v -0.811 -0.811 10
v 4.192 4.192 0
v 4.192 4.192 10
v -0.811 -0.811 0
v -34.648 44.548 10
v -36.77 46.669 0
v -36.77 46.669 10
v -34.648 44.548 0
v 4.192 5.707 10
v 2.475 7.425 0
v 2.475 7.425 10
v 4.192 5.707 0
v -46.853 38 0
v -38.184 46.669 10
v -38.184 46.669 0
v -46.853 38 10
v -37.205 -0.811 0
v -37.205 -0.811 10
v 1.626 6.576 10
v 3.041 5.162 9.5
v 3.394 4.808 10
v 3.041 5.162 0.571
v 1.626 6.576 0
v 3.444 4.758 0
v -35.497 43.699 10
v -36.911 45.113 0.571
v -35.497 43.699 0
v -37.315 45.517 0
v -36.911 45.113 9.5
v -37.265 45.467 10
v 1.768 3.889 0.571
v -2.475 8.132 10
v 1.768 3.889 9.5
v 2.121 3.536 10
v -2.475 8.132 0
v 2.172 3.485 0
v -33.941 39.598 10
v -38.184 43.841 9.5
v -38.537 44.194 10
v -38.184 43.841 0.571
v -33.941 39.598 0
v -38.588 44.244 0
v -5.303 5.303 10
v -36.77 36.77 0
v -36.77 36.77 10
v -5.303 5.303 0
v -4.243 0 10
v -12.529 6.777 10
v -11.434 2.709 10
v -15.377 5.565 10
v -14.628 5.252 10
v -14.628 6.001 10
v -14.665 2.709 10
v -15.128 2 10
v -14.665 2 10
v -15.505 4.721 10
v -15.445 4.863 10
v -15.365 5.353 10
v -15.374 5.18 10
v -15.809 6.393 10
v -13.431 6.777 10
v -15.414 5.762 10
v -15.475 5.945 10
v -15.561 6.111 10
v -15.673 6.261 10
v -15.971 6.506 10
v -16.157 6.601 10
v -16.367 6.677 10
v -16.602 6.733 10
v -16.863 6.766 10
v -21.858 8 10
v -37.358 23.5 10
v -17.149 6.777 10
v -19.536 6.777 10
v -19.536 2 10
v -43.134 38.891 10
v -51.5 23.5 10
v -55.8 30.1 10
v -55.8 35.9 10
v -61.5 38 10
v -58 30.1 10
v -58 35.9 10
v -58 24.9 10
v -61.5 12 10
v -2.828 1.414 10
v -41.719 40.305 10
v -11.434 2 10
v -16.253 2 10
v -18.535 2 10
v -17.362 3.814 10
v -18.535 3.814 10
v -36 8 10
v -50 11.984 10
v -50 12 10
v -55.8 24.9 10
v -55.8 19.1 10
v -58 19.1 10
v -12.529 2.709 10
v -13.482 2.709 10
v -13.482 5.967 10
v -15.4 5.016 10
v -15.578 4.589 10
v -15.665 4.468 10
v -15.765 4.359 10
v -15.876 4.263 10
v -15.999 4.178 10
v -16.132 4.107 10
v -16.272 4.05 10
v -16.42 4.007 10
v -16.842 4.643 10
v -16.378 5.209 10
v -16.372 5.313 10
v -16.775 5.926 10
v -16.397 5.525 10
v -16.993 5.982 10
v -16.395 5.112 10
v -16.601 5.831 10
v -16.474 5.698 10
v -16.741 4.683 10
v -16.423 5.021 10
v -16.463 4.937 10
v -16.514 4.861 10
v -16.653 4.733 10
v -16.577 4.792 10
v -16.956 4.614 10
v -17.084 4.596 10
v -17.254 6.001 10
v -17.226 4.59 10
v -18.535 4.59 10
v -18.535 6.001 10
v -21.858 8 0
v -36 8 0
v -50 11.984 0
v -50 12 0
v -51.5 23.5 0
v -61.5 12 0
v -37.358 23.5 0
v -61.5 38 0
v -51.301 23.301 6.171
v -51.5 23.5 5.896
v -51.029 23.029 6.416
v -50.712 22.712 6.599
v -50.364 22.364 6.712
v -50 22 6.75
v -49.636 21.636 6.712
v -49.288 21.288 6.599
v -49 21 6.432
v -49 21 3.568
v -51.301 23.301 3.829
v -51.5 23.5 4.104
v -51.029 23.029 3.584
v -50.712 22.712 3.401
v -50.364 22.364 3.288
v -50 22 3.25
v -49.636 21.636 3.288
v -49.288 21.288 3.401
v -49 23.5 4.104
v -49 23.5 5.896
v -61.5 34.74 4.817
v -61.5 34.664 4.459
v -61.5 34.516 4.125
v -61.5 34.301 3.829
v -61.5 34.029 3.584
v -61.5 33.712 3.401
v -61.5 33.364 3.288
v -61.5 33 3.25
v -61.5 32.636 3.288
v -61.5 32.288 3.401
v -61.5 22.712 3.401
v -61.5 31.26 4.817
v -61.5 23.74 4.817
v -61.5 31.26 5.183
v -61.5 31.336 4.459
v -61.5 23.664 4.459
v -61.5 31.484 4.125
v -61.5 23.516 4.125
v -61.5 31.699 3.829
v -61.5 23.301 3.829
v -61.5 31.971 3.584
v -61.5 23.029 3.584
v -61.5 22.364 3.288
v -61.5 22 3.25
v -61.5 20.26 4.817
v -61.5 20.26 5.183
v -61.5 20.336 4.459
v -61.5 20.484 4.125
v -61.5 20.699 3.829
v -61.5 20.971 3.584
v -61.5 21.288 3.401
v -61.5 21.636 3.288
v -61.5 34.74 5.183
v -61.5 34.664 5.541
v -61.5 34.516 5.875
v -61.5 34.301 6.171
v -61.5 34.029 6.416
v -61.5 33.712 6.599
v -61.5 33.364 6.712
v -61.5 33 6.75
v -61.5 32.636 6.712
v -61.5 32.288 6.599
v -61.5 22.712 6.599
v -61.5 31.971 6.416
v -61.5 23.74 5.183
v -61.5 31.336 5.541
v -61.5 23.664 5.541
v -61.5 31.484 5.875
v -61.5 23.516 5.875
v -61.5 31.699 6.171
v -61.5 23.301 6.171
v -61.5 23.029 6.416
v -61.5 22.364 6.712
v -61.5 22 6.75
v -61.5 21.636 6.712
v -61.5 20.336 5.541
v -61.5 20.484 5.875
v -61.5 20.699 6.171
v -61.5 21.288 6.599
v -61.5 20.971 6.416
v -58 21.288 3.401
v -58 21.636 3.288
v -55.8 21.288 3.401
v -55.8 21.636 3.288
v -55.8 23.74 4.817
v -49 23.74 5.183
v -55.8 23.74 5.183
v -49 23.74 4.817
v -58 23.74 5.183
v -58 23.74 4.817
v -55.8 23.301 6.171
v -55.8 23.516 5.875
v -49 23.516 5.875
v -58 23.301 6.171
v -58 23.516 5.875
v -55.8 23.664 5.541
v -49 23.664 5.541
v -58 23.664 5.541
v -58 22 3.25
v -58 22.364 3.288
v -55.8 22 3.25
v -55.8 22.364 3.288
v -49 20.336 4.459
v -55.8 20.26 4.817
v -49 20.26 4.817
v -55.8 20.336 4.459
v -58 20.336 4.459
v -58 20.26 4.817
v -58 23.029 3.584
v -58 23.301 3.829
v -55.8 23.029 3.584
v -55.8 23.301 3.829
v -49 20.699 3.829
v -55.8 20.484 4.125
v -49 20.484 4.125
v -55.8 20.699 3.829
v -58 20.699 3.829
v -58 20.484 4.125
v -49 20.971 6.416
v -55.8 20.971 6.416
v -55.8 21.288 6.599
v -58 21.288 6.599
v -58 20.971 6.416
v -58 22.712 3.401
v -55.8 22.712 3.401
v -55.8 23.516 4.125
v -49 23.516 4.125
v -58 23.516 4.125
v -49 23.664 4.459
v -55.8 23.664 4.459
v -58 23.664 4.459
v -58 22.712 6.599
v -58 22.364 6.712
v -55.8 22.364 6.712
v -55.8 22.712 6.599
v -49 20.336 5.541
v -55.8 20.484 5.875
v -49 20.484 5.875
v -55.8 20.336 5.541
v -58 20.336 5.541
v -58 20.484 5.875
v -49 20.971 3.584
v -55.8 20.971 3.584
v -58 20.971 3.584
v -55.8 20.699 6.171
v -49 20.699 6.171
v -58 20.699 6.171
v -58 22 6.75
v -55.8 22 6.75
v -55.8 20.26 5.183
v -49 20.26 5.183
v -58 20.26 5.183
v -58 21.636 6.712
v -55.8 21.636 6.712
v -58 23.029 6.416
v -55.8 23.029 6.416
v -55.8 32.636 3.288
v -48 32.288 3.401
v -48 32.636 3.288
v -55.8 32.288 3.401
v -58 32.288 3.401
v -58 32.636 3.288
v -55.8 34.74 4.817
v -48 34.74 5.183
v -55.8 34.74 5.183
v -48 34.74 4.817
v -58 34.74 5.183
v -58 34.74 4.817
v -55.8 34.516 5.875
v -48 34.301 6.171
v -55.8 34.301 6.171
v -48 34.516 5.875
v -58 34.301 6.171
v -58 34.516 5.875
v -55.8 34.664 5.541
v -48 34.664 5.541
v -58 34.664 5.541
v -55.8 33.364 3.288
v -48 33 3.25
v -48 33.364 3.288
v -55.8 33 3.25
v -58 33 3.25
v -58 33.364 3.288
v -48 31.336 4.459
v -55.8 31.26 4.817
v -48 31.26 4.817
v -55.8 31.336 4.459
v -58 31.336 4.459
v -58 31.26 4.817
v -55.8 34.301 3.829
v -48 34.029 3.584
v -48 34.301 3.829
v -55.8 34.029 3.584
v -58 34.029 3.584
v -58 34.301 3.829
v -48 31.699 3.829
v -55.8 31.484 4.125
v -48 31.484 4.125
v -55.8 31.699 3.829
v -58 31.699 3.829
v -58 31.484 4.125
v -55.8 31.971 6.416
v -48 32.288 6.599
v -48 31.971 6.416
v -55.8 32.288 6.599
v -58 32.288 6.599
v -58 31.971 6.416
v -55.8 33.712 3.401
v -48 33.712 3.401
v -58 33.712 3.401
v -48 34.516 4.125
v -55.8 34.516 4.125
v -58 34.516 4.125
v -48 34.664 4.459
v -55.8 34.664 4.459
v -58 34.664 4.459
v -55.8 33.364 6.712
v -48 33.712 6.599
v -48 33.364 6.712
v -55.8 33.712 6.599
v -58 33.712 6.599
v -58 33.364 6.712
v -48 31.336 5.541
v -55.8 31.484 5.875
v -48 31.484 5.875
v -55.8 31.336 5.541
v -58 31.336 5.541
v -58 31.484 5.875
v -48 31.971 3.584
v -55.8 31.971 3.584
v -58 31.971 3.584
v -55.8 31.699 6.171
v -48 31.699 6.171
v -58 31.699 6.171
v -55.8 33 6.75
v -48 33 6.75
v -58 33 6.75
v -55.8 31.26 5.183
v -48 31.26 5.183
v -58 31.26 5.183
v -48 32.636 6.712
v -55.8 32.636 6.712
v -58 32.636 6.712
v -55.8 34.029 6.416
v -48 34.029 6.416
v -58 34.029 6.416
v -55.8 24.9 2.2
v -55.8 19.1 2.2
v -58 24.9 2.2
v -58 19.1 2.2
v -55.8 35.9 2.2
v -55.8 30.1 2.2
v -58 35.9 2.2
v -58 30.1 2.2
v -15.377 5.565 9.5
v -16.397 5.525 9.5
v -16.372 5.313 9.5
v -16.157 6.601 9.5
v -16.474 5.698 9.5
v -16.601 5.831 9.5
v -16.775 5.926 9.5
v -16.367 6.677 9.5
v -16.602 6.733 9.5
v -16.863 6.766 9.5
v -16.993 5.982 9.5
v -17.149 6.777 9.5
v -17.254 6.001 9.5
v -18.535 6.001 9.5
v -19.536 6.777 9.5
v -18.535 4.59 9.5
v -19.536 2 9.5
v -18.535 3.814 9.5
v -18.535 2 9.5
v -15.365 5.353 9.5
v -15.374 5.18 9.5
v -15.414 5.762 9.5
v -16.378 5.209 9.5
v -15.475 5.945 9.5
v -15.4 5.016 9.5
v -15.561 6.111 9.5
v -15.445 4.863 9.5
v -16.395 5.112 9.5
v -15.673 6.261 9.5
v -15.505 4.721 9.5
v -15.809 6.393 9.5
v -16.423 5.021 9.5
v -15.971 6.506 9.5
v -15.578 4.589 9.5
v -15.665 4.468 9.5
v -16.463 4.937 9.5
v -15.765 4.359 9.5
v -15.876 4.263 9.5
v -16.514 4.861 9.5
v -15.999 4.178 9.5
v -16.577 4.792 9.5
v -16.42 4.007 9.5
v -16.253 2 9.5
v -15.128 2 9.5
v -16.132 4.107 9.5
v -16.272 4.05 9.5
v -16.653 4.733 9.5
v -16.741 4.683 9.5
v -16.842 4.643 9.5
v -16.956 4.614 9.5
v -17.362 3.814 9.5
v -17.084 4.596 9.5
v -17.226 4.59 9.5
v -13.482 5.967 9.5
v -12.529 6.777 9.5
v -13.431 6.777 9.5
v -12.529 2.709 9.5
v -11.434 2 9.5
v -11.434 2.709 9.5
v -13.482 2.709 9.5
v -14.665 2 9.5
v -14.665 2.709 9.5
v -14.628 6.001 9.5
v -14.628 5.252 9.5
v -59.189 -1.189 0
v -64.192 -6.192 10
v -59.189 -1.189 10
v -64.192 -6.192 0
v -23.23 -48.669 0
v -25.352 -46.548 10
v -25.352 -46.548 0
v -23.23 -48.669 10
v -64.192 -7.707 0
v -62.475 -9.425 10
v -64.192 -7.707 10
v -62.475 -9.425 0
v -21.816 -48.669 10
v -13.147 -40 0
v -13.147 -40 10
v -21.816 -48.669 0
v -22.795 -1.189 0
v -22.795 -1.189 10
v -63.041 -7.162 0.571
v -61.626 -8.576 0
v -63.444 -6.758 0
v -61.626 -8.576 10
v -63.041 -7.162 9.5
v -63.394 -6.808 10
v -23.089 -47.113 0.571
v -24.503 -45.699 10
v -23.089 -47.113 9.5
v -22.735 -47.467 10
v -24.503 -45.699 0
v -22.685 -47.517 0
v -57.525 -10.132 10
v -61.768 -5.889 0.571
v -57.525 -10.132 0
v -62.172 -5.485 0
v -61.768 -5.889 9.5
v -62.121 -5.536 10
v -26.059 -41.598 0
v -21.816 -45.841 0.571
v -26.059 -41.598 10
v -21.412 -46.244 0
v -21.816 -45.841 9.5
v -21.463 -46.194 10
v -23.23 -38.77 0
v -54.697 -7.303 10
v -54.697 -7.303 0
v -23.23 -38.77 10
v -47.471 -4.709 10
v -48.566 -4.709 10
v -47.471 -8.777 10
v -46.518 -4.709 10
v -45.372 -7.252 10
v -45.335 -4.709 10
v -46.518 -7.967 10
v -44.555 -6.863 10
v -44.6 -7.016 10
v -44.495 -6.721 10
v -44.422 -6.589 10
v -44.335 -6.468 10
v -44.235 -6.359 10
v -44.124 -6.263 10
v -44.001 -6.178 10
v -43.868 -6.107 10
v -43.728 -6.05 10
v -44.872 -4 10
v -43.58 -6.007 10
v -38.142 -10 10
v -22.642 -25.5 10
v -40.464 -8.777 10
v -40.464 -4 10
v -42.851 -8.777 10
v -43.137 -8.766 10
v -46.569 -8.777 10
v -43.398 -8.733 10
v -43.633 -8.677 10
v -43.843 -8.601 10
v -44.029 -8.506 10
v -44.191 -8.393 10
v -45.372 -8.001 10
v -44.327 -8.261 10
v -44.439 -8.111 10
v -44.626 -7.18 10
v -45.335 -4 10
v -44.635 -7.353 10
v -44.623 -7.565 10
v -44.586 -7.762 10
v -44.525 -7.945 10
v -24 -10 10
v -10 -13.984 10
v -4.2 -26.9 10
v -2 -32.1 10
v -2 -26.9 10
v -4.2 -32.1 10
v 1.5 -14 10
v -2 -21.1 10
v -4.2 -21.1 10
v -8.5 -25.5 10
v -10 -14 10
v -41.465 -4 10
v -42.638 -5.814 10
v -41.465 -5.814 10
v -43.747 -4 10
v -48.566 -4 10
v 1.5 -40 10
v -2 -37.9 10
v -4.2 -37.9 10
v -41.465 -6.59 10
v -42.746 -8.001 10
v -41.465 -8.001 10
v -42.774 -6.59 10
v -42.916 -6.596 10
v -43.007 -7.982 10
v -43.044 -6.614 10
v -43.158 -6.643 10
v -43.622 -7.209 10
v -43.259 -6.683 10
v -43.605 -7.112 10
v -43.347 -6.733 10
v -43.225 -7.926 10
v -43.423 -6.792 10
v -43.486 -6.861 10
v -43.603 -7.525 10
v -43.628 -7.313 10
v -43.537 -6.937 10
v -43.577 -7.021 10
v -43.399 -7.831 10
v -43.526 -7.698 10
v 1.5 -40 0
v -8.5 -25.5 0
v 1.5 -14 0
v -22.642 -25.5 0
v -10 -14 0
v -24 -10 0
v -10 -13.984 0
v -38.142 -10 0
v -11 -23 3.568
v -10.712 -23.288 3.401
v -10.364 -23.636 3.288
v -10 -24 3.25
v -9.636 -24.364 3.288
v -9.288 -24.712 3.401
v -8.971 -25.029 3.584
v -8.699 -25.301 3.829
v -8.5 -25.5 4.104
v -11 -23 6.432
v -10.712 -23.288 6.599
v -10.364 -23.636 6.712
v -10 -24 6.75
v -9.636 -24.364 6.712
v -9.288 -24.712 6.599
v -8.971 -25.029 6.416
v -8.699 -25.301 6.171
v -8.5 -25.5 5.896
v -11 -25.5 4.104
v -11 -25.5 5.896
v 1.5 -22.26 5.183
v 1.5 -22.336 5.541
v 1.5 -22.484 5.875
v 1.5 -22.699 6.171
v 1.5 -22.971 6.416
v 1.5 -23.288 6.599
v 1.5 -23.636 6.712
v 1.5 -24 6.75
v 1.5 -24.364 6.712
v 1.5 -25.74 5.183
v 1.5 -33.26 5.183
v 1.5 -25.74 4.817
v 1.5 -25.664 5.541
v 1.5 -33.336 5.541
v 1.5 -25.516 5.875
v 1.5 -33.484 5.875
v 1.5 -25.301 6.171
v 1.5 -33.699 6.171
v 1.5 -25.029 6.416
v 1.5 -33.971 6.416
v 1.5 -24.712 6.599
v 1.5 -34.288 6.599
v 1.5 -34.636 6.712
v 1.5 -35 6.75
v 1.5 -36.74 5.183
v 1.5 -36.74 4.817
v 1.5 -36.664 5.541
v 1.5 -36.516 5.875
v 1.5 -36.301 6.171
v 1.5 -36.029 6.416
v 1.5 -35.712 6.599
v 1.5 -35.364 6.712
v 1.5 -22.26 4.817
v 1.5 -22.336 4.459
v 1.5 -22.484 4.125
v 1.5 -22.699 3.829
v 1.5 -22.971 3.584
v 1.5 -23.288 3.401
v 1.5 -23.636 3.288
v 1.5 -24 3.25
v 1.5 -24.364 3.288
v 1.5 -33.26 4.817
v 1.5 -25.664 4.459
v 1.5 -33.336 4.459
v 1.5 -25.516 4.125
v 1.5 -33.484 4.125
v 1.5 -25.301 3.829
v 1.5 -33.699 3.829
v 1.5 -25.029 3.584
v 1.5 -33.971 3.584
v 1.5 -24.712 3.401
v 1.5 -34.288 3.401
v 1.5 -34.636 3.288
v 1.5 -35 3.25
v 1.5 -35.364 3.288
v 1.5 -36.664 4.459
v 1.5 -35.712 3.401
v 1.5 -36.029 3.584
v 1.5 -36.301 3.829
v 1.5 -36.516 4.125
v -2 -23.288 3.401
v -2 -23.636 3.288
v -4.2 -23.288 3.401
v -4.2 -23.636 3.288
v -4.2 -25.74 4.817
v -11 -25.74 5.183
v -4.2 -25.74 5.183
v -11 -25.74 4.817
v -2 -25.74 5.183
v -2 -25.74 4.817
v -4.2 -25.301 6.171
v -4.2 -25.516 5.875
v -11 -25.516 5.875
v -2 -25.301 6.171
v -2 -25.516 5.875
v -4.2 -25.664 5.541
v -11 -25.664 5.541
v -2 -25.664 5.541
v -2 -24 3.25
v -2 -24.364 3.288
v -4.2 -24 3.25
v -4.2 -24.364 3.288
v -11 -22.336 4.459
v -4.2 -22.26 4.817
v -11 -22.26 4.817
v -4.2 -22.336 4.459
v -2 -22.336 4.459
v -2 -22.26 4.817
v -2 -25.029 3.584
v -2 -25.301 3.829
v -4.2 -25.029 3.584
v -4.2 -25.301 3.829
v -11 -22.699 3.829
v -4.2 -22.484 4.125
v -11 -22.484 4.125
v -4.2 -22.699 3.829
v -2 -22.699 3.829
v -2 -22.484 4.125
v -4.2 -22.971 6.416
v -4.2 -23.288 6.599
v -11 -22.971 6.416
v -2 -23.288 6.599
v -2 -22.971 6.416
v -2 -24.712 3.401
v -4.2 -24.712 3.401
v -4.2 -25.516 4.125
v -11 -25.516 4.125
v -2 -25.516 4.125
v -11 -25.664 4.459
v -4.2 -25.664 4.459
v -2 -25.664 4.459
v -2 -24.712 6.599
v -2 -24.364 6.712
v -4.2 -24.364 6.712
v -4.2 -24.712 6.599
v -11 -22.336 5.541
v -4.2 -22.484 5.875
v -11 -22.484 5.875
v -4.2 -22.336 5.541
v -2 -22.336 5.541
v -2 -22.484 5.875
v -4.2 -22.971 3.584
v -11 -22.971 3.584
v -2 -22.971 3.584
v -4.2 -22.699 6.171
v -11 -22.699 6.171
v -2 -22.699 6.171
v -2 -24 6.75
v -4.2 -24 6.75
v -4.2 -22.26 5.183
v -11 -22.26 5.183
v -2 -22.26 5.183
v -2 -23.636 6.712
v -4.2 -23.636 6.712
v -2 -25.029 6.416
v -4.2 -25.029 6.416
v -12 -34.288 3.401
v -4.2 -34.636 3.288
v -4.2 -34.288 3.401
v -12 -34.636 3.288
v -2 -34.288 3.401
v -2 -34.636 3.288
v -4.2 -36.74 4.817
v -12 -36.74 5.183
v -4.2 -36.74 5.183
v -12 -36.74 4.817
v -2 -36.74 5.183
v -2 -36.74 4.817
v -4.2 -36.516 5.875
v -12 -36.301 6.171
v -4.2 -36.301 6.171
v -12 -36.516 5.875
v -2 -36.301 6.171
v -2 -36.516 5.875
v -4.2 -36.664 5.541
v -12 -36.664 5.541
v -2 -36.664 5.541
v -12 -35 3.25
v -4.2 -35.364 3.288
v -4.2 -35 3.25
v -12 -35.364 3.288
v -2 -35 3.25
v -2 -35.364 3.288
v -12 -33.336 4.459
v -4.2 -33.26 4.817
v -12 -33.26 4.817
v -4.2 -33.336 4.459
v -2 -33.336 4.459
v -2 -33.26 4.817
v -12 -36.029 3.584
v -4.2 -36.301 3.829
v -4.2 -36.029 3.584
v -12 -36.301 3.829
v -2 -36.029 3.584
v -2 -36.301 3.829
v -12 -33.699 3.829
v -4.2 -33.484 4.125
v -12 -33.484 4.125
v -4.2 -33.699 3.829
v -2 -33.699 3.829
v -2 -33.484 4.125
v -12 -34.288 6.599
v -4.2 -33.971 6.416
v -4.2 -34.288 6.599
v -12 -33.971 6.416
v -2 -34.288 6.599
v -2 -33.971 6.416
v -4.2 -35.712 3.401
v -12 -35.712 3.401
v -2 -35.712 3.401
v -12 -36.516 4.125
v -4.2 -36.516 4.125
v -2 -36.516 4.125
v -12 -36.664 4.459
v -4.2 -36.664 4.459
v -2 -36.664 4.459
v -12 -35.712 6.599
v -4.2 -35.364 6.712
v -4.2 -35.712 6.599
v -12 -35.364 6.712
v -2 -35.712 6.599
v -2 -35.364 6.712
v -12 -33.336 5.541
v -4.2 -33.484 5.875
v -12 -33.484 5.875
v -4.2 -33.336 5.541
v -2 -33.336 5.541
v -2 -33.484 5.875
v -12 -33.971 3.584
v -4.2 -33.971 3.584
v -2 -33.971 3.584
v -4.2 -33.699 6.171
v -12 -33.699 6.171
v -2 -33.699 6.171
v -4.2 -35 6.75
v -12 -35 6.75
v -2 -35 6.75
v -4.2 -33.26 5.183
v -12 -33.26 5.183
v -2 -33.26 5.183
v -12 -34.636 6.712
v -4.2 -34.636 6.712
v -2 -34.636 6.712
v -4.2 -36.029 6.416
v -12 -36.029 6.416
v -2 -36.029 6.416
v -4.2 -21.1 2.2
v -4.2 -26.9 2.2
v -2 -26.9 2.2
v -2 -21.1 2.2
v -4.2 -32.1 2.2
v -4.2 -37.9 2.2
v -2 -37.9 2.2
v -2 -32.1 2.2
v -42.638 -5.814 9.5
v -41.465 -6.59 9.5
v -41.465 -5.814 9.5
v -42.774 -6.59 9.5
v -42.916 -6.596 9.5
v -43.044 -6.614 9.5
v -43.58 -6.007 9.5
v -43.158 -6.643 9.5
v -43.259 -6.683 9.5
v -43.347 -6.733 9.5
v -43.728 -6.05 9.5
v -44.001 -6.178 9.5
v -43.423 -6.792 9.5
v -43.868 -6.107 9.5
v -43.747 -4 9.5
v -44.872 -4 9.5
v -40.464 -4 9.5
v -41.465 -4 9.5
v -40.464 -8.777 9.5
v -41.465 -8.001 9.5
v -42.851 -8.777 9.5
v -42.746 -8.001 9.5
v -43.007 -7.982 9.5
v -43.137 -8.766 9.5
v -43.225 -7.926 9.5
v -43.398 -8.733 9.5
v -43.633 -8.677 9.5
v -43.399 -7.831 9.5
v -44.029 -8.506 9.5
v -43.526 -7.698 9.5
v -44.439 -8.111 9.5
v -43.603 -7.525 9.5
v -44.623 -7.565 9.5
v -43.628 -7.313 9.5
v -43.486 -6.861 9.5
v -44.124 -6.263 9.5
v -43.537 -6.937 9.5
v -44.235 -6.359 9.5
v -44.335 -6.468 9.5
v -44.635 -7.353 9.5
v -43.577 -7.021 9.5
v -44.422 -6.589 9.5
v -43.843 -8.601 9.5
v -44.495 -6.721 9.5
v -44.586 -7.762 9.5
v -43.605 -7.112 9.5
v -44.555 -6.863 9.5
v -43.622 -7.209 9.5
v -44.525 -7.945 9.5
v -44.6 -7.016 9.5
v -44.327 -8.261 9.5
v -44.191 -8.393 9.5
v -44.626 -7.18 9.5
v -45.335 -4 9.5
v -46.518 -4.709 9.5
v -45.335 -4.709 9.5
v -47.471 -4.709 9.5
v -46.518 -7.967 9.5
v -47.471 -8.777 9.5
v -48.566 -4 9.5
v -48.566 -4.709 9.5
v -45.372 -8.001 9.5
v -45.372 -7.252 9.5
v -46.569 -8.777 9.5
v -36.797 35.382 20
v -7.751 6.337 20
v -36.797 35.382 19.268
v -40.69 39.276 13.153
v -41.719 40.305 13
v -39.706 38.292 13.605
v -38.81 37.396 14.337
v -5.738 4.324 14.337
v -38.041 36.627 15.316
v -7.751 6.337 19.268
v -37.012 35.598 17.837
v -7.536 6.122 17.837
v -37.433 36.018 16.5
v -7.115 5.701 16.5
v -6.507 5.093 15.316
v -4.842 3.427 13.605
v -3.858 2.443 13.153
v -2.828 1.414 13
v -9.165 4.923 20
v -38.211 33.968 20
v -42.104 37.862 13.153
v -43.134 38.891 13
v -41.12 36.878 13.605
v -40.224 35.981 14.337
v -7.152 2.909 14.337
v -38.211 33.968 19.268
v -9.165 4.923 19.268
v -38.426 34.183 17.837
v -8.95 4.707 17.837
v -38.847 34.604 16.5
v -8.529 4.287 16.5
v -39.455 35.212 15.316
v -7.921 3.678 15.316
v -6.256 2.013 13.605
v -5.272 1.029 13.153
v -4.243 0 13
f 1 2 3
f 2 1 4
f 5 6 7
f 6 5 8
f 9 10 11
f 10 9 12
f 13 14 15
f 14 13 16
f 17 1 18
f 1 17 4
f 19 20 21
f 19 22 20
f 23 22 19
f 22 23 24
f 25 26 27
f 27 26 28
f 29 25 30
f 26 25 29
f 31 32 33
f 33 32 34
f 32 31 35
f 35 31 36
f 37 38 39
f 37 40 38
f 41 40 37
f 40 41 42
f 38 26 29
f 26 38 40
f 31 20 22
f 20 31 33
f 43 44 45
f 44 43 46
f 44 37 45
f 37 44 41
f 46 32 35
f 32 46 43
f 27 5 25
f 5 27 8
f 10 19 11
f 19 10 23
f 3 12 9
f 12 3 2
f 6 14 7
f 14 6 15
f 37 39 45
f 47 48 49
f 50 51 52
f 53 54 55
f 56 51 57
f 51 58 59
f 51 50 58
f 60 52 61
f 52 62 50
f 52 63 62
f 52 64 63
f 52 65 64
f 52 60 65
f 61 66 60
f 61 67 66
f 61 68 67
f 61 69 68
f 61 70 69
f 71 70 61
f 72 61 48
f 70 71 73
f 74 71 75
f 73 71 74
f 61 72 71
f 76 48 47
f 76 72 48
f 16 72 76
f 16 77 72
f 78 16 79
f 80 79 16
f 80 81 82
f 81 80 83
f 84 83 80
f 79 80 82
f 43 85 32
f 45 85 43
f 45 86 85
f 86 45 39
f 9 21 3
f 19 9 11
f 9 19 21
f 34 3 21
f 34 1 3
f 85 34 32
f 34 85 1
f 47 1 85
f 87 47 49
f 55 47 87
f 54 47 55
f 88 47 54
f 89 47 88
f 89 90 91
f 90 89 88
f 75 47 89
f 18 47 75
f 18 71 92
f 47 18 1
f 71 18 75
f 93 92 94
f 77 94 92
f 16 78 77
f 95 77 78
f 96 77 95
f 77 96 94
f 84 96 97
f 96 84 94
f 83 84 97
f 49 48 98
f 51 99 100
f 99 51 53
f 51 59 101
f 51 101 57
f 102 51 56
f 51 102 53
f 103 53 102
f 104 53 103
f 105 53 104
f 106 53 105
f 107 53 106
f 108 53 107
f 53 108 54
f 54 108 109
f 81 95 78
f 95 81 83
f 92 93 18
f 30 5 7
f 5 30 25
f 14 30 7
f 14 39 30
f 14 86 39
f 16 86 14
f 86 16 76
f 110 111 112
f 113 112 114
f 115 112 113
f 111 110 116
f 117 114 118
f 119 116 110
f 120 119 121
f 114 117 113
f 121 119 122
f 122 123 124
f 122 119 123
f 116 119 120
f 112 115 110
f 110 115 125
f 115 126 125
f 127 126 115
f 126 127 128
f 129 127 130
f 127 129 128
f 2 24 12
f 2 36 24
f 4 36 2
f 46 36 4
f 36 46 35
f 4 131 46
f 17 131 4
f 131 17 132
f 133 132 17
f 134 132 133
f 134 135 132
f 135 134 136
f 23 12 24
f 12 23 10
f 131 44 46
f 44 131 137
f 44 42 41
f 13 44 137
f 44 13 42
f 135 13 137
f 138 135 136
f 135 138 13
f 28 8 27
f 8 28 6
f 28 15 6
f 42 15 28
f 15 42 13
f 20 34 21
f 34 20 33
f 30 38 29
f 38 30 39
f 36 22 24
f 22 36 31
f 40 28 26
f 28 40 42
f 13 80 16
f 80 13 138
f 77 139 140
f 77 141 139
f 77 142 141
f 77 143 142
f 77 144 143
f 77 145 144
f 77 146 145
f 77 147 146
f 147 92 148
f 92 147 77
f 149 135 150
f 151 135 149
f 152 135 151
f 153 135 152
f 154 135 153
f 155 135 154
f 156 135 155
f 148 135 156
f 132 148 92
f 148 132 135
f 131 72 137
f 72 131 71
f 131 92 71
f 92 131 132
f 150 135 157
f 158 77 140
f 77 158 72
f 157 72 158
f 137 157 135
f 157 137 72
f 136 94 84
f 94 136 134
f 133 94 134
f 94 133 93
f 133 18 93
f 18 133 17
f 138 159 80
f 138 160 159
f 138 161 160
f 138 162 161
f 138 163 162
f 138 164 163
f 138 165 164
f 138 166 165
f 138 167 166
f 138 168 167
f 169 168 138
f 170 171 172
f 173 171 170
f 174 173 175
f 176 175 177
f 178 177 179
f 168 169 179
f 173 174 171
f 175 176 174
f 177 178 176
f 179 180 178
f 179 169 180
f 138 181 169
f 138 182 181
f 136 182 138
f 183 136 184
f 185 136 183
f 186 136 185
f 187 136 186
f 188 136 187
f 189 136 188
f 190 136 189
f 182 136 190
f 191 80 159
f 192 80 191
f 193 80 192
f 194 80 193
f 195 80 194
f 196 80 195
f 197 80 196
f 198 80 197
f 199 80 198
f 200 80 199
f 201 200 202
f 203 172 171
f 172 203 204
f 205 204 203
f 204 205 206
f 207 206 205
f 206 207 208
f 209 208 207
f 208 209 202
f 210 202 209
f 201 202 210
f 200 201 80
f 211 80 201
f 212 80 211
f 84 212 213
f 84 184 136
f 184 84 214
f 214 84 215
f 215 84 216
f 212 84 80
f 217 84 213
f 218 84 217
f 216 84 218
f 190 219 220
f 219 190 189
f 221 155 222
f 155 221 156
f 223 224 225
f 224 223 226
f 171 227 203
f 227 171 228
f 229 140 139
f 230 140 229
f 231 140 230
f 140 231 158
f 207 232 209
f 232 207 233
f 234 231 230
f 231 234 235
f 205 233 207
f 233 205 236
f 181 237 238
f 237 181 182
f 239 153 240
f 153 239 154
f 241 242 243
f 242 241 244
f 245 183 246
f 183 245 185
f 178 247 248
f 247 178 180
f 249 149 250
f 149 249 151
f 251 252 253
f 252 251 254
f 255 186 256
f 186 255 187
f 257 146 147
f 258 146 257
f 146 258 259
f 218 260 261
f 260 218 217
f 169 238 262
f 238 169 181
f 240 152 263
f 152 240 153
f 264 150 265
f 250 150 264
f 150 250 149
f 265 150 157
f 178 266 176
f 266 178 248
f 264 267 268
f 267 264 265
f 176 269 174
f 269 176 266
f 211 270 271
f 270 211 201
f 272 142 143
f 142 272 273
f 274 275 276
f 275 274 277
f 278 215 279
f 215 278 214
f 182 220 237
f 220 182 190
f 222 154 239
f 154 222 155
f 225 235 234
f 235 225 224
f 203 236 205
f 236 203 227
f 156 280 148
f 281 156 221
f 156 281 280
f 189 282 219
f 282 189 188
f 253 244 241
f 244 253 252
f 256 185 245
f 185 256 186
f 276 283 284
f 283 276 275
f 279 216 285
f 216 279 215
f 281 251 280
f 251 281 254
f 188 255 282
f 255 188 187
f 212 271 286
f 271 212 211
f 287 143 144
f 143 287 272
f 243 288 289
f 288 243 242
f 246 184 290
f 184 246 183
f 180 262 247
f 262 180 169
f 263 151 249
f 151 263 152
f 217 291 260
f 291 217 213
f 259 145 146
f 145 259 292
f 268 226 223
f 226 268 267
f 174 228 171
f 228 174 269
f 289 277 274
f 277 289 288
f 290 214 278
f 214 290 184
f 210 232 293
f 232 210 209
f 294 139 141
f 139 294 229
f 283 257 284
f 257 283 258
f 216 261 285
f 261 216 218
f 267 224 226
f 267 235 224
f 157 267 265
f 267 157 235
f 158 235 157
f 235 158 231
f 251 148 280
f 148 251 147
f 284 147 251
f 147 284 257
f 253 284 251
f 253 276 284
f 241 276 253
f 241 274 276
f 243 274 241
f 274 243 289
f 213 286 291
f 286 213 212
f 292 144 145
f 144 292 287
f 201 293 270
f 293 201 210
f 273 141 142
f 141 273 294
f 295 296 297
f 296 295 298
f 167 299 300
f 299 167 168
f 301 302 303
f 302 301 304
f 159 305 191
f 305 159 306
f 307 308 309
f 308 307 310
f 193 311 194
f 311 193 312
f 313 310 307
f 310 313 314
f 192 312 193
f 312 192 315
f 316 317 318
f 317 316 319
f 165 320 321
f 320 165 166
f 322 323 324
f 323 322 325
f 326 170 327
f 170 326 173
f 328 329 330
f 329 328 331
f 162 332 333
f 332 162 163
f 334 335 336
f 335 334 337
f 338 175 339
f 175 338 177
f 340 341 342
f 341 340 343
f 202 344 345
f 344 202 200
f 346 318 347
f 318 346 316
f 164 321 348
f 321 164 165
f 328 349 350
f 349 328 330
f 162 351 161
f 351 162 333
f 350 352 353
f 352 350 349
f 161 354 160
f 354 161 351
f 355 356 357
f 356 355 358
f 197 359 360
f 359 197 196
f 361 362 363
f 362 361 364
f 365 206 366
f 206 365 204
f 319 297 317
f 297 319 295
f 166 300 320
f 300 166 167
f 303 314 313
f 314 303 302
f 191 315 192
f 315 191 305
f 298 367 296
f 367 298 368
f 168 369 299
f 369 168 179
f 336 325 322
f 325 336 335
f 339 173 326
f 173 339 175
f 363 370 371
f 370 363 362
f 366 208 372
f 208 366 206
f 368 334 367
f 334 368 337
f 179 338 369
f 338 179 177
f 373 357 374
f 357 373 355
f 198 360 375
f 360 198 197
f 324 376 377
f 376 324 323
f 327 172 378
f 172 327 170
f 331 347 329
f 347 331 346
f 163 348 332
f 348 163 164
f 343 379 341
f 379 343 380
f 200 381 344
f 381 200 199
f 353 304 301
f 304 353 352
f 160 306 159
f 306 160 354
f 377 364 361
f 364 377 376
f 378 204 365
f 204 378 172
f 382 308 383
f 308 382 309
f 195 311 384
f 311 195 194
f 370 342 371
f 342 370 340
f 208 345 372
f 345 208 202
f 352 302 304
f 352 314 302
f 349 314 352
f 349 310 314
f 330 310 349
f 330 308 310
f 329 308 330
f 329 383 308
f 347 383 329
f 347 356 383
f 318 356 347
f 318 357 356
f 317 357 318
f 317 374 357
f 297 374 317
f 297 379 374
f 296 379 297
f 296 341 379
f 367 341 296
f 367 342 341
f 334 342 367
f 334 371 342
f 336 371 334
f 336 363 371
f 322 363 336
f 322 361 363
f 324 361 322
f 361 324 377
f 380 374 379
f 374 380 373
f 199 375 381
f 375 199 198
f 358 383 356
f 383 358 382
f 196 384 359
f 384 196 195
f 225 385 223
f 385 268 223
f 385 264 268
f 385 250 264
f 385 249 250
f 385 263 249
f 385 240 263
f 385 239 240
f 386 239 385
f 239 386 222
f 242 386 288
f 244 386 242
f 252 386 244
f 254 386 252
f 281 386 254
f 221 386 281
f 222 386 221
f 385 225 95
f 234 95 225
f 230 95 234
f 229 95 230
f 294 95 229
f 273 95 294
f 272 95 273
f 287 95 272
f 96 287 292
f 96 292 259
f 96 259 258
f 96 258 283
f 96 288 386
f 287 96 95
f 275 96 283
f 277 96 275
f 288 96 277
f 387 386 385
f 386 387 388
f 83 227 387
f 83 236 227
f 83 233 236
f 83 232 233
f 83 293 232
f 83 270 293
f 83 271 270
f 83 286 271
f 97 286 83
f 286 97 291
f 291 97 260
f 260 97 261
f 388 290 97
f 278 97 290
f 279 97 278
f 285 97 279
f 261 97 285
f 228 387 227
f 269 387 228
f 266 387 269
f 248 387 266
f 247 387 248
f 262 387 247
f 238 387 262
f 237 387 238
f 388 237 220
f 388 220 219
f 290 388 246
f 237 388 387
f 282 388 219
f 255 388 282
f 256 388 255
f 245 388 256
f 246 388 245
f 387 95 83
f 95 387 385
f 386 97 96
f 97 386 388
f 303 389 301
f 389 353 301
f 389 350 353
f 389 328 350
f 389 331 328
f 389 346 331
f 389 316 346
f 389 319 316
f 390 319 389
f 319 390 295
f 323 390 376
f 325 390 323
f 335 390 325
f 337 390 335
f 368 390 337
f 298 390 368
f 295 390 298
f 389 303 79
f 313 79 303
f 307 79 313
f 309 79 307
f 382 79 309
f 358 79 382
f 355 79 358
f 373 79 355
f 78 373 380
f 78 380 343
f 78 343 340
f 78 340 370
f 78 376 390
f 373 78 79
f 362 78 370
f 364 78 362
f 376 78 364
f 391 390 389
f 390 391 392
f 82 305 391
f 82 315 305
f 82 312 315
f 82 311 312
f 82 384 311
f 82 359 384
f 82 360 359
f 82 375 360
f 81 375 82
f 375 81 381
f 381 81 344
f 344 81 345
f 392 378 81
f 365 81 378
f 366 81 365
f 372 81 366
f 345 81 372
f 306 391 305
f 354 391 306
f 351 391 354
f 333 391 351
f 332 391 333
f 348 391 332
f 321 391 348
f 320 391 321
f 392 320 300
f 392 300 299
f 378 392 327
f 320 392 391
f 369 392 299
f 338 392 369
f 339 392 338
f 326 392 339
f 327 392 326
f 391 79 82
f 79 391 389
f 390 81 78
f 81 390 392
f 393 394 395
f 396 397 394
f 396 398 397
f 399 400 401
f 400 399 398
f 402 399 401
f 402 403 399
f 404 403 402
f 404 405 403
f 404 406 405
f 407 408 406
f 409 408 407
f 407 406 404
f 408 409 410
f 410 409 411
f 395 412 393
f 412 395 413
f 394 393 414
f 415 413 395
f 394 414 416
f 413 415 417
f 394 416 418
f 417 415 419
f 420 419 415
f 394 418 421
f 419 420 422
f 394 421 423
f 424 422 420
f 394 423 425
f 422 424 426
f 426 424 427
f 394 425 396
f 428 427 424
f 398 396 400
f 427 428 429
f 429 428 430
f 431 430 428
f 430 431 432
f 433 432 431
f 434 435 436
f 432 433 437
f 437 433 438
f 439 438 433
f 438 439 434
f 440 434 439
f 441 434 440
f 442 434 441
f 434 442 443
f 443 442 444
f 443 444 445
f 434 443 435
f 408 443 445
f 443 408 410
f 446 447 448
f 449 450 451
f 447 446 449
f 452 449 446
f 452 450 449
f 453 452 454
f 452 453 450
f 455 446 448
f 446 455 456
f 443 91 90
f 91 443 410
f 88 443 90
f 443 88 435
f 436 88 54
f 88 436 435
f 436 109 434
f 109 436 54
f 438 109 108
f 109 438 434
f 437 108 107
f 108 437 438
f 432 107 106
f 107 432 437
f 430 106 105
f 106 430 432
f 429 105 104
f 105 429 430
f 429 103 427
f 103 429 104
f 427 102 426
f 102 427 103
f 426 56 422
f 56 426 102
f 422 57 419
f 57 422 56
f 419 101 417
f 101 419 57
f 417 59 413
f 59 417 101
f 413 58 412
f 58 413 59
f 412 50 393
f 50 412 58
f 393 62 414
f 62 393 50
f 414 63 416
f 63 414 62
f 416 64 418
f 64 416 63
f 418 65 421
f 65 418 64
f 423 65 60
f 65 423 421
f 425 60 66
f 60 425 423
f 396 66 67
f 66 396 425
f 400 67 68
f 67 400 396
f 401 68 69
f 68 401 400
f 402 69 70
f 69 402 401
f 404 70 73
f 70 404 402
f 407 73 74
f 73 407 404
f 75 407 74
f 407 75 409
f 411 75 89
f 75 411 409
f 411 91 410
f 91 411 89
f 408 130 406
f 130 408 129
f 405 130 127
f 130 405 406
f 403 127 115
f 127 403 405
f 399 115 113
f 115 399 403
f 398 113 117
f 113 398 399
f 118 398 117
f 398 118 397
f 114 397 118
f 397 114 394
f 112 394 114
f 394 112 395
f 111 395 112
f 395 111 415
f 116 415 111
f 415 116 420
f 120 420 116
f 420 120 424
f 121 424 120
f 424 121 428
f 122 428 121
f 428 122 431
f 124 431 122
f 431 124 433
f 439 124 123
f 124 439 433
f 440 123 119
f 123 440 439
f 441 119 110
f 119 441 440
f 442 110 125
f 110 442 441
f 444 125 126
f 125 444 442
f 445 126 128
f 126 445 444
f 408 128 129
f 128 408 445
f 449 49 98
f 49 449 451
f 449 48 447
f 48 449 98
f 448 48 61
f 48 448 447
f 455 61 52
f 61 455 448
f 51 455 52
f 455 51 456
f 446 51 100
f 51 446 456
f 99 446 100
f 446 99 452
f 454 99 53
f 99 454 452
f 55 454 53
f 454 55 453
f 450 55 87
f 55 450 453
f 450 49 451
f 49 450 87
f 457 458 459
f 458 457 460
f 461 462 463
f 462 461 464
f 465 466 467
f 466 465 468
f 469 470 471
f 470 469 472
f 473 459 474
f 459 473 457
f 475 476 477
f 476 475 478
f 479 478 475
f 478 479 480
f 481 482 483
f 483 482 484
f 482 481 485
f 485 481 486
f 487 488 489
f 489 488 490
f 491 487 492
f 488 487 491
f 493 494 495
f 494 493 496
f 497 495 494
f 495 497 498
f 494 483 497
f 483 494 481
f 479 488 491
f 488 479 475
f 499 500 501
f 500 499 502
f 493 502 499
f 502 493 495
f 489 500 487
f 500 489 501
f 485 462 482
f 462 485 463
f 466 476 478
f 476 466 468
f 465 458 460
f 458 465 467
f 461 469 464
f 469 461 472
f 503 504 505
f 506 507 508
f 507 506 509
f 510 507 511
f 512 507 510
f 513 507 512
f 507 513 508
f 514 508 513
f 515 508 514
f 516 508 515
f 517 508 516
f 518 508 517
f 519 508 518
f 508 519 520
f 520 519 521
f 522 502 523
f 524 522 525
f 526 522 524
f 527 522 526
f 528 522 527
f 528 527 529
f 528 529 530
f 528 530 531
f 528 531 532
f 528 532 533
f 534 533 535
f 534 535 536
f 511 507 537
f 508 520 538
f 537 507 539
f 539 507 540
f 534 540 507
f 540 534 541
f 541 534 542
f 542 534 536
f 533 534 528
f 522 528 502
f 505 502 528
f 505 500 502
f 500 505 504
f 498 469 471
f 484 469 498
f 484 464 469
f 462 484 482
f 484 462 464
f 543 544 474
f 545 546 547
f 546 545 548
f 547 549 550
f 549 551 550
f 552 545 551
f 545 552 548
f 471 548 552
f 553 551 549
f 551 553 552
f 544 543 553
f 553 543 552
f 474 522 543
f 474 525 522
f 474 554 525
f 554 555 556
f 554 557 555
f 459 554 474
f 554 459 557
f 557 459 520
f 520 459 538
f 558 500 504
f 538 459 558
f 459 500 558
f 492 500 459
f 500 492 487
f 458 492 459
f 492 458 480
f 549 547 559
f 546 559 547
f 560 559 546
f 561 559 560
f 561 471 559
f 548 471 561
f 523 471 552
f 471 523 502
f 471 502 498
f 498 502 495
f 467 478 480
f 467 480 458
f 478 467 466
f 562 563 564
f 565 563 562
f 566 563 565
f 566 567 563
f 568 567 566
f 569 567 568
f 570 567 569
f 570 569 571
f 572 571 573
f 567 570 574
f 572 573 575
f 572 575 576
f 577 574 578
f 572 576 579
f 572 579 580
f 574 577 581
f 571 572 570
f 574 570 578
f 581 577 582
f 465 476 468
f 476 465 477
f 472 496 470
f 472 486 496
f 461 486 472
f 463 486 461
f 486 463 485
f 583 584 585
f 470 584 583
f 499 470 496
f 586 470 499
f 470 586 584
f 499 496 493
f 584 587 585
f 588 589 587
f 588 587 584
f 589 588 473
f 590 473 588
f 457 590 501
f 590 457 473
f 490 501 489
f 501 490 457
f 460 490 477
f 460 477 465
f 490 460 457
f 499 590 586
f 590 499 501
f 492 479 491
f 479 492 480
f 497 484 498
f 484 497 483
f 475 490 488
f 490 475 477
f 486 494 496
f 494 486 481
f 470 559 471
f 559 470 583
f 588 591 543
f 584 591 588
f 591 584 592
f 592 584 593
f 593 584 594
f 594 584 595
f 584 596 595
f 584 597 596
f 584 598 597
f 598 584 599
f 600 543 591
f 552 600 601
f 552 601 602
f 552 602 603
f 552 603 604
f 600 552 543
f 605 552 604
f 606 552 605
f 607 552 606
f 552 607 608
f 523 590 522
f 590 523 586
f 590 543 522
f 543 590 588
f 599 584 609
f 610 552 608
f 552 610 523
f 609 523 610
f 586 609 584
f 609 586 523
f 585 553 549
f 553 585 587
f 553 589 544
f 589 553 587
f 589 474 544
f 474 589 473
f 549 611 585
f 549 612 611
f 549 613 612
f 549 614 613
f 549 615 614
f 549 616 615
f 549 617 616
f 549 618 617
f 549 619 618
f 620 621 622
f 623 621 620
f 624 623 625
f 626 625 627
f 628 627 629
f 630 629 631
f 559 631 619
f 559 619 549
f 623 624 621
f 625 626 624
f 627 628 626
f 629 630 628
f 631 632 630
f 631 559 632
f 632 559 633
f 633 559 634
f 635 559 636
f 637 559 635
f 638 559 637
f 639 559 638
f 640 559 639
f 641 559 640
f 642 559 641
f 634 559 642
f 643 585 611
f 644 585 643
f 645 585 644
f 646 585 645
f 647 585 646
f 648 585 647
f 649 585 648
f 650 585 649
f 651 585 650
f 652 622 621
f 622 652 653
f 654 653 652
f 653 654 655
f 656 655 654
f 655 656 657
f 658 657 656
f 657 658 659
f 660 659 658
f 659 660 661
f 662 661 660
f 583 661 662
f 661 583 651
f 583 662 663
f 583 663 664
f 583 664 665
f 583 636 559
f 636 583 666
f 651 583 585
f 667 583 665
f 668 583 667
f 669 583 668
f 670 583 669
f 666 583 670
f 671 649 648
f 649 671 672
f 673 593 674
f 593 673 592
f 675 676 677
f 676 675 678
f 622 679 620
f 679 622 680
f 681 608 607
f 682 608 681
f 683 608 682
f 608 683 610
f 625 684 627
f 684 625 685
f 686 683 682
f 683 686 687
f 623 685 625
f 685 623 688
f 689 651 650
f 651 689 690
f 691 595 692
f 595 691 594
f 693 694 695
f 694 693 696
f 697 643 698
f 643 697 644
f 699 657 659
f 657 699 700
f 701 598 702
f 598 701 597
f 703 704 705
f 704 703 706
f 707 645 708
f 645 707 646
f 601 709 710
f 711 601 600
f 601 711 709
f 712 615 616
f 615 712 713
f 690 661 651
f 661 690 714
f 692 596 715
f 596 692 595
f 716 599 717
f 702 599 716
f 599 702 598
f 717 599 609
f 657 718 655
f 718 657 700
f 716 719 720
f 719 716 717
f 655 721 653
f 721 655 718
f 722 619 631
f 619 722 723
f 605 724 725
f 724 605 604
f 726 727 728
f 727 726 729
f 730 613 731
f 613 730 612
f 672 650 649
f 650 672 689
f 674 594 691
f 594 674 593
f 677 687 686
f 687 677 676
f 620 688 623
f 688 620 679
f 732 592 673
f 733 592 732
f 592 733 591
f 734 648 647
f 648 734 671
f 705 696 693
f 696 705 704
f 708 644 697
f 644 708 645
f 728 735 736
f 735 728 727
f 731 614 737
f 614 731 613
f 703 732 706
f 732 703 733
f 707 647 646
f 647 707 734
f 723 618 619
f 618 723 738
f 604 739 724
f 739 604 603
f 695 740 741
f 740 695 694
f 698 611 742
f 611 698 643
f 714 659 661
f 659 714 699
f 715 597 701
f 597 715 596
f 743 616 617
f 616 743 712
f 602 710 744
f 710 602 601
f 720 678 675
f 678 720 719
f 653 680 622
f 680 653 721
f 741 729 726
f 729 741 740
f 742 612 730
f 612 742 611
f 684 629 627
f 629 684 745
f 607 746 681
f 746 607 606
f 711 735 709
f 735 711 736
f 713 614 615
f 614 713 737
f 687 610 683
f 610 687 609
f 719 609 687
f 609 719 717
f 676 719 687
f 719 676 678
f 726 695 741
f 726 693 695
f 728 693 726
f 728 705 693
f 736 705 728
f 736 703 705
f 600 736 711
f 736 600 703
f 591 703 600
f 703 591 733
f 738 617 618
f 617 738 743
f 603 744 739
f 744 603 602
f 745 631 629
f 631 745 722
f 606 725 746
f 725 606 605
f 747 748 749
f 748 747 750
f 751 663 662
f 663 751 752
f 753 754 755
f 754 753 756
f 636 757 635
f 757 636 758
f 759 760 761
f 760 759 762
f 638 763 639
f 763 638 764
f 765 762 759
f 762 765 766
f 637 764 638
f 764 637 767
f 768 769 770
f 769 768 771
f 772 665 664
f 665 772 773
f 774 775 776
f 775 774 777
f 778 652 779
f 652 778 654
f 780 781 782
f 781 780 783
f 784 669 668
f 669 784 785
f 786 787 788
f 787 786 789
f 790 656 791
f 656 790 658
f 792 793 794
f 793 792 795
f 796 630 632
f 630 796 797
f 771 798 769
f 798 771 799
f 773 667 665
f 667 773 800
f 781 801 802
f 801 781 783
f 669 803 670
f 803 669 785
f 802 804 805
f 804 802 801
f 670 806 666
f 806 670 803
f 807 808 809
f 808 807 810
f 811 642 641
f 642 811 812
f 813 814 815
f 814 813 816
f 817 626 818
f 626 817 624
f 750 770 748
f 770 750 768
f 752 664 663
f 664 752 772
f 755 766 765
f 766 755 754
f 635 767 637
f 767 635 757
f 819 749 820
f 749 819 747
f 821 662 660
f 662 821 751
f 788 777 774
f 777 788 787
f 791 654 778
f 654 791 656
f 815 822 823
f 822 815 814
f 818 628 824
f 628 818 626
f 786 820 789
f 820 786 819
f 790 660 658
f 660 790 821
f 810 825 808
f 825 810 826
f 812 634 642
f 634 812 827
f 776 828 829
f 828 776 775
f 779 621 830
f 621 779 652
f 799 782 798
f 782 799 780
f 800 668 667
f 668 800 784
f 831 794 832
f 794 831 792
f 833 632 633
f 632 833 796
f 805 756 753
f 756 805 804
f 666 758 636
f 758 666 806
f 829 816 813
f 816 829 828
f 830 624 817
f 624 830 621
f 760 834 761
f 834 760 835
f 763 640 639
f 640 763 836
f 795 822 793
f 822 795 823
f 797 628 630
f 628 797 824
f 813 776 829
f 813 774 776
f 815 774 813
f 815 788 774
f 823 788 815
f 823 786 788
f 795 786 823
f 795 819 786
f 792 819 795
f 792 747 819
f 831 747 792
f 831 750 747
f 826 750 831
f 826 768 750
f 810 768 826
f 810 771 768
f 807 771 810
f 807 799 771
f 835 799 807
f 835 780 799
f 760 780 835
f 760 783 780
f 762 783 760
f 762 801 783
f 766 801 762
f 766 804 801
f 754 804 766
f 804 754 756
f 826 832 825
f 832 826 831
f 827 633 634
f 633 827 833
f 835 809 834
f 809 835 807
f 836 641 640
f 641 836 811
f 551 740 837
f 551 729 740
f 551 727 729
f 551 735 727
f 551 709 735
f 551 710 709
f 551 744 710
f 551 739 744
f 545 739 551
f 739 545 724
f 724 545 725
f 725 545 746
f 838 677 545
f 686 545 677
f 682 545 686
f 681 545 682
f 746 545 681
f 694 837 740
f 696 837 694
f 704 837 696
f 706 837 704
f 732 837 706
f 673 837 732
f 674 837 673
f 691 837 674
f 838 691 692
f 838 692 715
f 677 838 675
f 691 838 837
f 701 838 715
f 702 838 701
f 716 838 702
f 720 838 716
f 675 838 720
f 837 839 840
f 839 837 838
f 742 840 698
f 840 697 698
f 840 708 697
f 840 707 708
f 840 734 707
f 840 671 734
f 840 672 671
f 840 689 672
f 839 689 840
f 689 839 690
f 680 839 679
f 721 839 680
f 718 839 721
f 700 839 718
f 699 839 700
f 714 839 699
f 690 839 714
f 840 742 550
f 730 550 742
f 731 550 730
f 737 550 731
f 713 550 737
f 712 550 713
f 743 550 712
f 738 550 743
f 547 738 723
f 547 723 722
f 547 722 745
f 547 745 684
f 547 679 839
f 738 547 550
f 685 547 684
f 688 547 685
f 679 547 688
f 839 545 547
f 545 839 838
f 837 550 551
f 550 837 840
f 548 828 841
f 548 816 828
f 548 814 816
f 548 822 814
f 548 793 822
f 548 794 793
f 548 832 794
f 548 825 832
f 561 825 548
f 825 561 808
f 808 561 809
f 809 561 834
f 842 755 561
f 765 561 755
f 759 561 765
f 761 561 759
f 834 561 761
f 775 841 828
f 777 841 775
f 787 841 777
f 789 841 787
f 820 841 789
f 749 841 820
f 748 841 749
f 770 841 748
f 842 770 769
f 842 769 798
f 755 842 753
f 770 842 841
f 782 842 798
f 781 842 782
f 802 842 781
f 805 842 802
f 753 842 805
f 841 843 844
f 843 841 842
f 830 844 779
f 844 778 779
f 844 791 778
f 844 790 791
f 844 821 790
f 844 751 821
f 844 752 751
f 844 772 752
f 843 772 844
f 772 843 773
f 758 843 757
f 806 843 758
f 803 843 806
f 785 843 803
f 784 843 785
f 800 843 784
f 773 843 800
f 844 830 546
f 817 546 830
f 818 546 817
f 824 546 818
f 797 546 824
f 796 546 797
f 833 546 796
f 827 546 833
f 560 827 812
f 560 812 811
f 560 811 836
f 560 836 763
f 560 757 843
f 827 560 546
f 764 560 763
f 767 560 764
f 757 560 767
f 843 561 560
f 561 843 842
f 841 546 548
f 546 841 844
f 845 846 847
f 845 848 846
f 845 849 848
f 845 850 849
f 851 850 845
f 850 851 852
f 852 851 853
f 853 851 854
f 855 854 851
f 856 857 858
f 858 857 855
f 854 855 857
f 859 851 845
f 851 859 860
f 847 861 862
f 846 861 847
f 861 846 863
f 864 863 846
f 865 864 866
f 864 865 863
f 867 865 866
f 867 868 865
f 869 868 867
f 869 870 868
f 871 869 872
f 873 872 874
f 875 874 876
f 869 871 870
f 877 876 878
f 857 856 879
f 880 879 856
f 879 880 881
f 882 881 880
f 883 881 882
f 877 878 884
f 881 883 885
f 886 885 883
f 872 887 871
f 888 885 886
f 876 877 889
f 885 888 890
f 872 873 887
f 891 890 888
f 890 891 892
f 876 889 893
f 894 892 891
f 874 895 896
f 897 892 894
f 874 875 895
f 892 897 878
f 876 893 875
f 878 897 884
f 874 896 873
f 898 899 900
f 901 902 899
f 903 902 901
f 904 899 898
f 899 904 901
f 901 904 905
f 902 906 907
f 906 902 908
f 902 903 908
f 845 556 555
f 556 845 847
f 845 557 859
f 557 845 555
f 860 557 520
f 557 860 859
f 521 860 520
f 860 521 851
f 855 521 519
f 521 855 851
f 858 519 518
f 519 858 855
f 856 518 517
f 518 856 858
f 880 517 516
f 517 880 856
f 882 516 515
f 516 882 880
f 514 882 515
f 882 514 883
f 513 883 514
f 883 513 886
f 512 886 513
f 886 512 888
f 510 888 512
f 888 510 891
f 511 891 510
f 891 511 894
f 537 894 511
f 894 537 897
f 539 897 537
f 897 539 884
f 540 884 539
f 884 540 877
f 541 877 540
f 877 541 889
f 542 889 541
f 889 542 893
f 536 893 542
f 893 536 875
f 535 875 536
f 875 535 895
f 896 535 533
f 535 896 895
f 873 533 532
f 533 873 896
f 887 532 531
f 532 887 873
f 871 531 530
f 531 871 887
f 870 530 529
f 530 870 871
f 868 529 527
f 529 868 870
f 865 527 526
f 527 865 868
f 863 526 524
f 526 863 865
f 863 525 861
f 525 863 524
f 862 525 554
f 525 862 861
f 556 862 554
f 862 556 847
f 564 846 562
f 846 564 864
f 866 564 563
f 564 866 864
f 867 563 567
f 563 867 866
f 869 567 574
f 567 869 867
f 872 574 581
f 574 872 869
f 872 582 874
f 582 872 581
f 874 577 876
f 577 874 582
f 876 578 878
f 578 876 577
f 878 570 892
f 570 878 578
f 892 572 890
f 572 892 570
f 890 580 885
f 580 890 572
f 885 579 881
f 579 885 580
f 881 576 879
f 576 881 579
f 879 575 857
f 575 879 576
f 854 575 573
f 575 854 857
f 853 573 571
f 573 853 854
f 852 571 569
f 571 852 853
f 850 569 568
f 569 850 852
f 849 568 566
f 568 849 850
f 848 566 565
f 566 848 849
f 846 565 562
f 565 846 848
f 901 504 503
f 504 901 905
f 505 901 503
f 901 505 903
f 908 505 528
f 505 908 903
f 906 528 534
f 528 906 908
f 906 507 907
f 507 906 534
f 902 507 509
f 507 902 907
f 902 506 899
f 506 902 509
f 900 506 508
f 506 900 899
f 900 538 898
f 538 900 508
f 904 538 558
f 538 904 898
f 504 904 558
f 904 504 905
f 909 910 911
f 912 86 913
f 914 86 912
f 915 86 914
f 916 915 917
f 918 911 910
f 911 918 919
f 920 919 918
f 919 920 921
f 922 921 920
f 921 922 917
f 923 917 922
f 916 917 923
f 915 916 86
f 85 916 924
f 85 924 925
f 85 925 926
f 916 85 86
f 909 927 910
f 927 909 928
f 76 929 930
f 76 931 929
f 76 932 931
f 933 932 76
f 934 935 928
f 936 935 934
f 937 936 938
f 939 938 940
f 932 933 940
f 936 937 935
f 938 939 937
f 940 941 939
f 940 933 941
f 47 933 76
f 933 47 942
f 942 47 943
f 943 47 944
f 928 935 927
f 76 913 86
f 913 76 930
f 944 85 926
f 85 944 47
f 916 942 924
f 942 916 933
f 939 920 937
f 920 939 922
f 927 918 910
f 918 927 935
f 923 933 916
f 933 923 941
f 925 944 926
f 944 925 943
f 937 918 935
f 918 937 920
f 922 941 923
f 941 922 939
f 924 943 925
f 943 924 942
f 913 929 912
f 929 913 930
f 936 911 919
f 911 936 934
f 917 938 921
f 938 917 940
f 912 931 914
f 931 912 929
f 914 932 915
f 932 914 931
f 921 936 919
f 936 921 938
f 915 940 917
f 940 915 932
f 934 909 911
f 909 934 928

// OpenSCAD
// PRUSA iteration4
// lcd supports
// GNU GPL v3
// Josef Průša <iam@josefprusa.cz> and contributors
// http://www.reprap.org/wiki/Prusa_Mendel
// http://prusamendel.org

module body() {

  difference() {
    // base block
    translate([-55, -2, 0]) cube([69, 81, 10]);

    union() {
      // outer body shape
      translate([-69.6, 32, -1]) rotate([0, 0, 45]) cube([60, 53, 15]);
      translate([13.7, 89.7, -1]) rotate([0, 0, 135]) cube([60, 42, 15]);
      translate([-19, -9, -1]) cube([60, 9, 15]);
      translate([7, -3, -1]) cube([60, 68, 16]);
      translate([-16, 60, -1]) cube([60, 50, 15]);
      translate([-41, -45, -1]) rotate([0, 0, 45]) cube([60, 80, 13]);

      // pcb cout out
      translate([4, 1.5, -1]) cube([1.8, 56.5, 17]);
      translate([0, 7.5, -1]) cube([5.8, 44.5, 17]);
      translate([4.8, 3.5, -1]) cube([5.8, 52.5, 17]);
      translate([8, -5, -1]) rotate([0, 0, 45]) cube([5, 5, 17]);
      translate([8, 58, -1]) rotate([0, 0, 45]) cube([5, 5, 17]);
    }

    // pcb inserts
    translate([4, 3, 8]) rotate([45, 0, 0]) cube([1.8, 5, 5]);
    translate([4, 56.5, 8]) rotate([45, 0, 0]) cube([1.8, 5, 5]);
    translate([4, 3, -5]) rotate([45, 0, 0]) cube([1.8, 5, 5]);
    translate([4, 56.5, -5]) rotate([45, 0, 0]) cube([1.8, 5, 5]);
  }
}

module support() {
  difference() {

    union() {
      rotate([0, 0, 45]) body();
      // screw block
      translate([-72, 22, 0]) cube([30, 16, 10]);
    }

    // lower angled part cut
    translate([-75, -2, -1]) cube([20, 14, 15]);
    translate([-70, -2, -1]) cube([20, 14, 15]);
    translate([-50, -16.3, -1]) rotate([0, 0, 45]) cube([20, 20, 15]);

    translate([-76.5, -2, -1]) cube([15, 40, 15]);

    difference() {
      translate([-28, 0, -1]) rotate([0, 0, 45]) cube([10, 40, 15]);
      translate([-38, -12, -1]) cube([20, 20, 15]);
      translate([-58, 23.5, -1]) cube([25, 25, 15]);
    }

    // screw holes
    translate([-71, 18 + 4, 5]) rotate([0, 90, 0]) cylinder(h=22, r=1.75, $fn=30);
    translate([-70, 29 + 4, 5]) rotate([0, 90, 0]) cylinder(h=22, r=1.75, $fn=30);

    // nut traps
    translate([-58, 15.1 + 4, 5 - 2.8]) cube([2.2, 5.8, 29.7]);
    translate([-58, 26.1 + 4, 5 - 2.8]) cube([2.2, 5.8, 29.7]);

    // version
    translate([-20, 2, 9.5]) rotate([0, 0, 0]) linear_extrude(height=0.6) { text("R1", font="helvetica:style=Bold", size=5, center=true); }
  }
}

module left_lcd_support() {
  support();

  rotate([0, 0, 45]) difference() {
      // sd card shield
      translate([-3, 3, 10]) cube([2, 55, 10]);
      translate([-4, 3, 20]) rotate([0, 90, 0]) cylinder(h=4, r=7, $fn=30);
      translate([-4, 58, 20]) rotate([0, 90, 0]) cylinder(h=4, r=7, $fn=30);
    }
}

translate([-60, -2, 0]) rotate([0, 0, 180]) support();
left_lcd_support();
